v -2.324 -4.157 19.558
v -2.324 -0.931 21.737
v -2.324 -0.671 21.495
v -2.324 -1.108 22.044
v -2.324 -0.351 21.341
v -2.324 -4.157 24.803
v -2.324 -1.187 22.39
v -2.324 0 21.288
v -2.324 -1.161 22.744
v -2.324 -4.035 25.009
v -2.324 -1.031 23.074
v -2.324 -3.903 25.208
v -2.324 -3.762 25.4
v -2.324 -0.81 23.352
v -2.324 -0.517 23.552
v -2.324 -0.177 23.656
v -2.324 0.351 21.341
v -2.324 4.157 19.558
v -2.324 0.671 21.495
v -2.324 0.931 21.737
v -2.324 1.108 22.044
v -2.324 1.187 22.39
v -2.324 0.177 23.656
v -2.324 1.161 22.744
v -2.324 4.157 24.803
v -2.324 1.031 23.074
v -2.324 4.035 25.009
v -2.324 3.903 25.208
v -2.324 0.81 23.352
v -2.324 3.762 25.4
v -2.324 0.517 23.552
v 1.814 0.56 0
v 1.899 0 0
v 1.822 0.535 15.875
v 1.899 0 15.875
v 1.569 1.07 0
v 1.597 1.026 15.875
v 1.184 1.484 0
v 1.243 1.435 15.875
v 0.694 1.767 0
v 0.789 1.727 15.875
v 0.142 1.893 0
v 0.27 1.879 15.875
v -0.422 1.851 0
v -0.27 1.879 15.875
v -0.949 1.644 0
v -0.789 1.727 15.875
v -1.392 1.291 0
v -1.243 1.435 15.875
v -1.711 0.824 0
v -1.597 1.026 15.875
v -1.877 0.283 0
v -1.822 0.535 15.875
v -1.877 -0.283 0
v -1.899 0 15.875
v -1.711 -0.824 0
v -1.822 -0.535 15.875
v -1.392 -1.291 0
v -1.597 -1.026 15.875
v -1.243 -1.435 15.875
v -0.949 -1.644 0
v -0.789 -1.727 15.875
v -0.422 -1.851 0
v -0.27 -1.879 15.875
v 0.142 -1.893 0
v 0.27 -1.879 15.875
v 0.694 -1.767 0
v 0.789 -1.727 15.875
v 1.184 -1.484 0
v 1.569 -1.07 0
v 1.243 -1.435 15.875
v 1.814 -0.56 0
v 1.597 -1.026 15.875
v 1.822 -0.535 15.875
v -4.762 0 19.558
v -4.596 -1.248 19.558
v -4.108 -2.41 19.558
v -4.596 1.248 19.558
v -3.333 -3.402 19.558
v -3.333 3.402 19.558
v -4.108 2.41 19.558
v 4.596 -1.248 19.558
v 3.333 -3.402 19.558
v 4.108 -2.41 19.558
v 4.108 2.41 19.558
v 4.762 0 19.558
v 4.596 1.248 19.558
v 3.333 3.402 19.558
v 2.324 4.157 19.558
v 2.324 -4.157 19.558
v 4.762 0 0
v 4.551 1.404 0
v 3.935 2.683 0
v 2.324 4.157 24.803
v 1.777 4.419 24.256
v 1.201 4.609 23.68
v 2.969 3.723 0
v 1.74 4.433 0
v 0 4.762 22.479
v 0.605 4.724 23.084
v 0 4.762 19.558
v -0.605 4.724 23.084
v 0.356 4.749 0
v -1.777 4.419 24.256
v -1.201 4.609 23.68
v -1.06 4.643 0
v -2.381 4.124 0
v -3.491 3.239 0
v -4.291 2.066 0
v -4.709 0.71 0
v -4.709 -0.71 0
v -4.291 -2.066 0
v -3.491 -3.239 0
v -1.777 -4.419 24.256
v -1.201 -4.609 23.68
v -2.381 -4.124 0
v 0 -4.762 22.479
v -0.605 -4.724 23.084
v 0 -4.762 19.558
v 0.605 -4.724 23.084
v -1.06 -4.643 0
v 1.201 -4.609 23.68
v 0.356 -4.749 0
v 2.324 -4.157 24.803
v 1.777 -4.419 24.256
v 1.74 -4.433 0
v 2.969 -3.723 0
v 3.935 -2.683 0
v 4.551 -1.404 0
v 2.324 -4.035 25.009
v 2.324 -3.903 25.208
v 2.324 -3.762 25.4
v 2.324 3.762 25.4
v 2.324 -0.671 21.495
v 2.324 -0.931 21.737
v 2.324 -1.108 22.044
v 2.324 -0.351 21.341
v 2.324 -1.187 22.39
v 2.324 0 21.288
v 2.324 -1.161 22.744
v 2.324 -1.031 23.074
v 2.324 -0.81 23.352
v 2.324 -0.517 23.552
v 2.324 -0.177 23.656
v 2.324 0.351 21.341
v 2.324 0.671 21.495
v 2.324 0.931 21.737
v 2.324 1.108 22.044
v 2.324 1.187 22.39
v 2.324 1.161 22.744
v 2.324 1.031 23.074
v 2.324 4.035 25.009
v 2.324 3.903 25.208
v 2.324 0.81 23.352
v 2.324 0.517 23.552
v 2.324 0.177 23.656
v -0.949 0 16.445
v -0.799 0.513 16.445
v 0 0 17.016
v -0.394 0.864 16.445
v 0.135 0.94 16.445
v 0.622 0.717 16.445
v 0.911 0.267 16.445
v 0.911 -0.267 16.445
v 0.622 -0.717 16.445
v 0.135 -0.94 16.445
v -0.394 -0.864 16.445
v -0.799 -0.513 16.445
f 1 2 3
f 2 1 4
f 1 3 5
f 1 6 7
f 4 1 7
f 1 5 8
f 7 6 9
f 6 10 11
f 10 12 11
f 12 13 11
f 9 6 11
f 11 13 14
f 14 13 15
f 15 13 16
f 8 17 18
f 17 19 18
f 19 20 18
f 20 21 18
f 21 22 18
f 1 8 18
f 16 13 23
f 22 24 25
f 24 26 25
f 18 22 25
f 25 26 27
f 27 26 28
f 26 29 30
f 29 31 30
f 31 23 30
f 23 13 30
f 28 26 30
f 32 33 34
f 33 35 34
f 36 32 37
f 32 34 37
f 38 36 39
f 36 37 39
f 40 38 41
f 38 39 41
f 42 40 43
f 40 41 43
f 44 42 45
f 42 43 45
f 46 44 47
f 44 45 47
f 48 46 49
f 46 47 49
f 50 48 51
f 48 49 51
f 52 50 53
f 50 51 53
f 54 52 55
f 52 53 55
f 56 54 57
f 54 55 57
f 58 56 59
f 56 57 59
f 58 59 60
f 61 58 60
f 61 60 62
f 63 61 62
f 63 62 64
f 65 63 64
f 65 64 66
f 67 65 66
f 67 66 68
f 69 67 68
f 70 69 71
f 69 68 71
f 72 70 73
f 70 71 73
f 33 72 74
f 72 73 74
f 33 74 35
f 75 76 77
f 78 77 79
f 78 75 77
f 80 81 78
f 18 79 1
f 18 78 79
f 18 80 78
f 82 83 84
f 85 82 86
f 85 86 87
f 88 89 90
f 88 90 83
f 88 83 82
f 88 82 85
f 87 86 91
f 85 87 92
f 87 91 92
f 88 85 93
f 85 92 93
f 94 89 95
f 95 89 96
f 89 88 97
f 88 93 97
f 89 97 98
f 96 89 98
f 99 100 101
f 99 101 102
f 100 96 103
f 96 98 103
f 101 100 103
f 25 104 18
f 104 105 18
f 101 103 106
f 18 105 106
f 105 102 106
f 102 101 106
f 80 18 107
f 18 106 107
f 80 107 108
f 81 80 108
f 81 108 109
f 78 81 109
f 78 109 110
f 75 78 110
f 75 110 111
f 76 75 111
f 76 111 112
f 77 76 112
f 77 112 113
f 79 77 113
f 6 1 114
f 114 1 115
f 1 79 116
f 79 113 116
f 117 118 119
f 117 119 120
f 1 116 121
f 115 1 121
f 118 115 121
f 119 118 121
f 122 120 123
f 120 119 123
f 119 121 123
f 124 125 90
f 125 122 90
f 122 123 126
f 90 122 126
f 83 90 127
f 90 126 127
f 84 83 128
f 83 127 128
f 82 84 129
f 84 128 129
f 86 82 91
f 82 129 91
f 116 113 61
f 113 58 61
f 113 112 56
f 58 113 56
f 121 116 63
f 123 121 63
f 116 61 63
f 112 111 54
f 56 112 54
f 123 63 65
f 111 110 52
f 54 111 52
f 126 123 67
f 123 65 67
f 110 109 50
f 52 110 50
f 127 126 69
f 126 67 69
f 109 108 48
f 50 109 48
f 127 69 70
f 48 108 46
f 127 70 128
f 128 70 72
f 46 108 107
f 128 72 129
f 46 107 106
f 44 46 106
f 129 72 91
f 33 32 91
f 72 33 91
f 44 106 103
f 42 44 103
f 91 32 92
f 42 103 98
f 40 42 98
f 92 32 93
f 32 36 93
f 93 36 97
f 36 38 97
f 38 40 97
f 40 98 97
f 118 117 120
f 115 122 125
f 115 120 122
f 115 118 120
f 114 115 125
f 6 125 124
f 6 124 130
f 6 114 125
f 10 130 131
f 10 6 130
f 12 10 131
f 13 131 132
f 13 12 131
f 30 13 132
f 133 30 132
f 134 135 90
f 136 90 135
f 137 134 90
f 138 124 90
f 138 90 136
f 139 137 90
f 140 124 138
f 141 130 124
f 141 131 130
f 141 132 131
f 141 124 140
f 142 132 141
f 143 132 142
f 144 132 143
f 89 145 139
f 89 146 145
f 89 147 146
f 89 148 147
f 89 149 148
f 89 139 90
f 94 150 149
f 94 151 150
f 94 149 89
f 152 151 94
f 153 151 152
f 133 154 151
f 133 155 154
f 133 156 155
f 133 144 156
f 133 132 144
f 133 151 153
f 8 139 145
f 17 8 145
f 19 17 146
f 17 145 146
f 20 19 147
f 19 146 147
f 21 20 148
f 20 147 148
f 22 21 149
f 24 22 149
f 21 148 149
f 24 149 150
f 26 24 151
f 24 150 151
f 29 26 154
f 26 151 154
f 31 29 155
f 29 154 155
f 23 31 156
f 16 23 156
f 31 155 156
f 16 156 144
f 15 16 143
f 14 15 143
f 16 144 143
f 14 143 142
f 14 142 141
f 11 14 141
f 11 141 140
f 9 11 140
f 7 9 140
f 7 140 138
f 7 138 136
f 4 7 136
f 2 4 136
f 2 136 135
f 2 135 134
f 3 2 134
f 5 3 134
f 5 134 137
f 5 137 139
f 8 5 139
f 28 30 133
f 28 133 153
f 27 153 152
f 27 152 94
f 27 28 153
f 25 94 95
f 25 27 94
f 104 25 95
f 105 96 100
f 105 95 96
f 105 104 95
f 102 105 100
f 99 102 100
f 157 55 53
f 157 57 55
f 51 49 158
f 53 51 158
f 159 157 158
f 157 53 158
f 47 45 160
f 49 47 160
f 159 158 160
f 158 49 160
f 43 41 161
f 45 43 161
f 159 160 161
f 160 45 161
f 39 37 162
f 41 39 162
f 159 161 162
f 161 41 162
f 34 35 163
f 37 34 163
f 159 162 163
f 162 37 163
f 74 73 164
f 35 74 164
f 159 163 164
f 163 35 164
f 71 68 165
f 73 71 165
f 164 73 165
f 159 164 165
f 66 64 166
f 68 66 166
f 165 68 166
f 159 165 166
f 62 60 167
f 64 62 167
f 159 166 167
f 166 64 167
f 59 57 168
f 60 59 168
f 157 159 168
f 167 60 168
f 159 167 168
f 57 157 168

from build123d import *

# Parameters (mm, degrees)
SKETCH1_R                       = 4.7625
BOSS_EXTRUDE1_DEPTH             = 25.4
SKETCH2_OUTSIDE_W               = 17.274
SKETCH2_OUTSIDE_H               = 17.274
SKETCH2_OUTSIDE_W_2             = 4.6482
SKETCH2_OUTSIDE_H_2             = 9.525
CUT_EXTRUDE1_DEPTH              = 5.842
F_3_32_0_09375_DIAMETER_HOLE1_D = 2.38125
CUT_EXTRUDE2_DEPTH              = 27.796665946
TAP_DRILL_FOR_10_24_TAP1_D      = 3.7973
TAP_DRILL_FOR_10_24_TAP1_DEPTH  = 15.875
TAP_DRILL_FOR_10_24_TAP1_TIP    = 1.140824014


with BuildPart() as part:
    # Sketch1 → Boss-Extrude1 (new body)
    with BuildSketch(Plane.XY):
        Circle(SKETCH1_R)
    extrude(amount=BOSS_EXTRUDE1_DEPTH)

    # Sketch2 outside → Cut-Extrude1 (cut)
    with BuildSketch(Plane.XY.offset(25.4)):
        Rectangle(SKETCH2_OUTSIDE_W, SKETCH2_OUTSIDE_H)
        Rectangle(SKETCH2_OUTSIDE_W_2, SKETCH2_OUTSIDE_H_2, mode=Mode.SUBTRACT)
    extrude(amount=-CUT_EXTRUDE1_DEPTH, mode=Mode.SUBTRACT)

    # 3/32 (0.09375) Diameter Hole1 (through all)
    with Locations(Plane.ZY.offset(2.3241)):
        with Locations((22.479, 0)):
            Hole(F_3_32_0_09375_DIAMETER_HOLE1_D / 2)

    # Sketch5 → Cut-Extrude2 (cut, through all)
    with BuildSketch(Plane.ZY.offset(2.3241)):
        with BuildLine():
            Line((22.479, 4.7625), (32.004, 4.7625))
            Line((32.004, 4.7625), (32.004, -4.7625))
            Line((32.004, -4.7625), (22.479, -4.7625))
            ThreePointArc((22.479, -4.7625), (27.2415, 0), (22.479, 4.7625))
        make_face()
    extrude(amount=-CUT_EXTRUDE2_DEPTH, mode=Mode.SUBTRACT)

    # Tap Drill for #10-24 Tap1
    with Locations(Plane(origin=(0, 0, 0), x_dir=(-1, 0, 0), z_dir=(0, 0, -1))):
        with Locations((0, 0)):
            Hole(TAP_DRILL_FOR_10_24_TAP1_D / 2, depth=TAP_DRILL_FOR_10_24_TAP1_DEPTH)
            with Locations((0, 0, -(TAP_DRILL_FOR_10_24_TAP1_DEPTH + TAP_DRILL_FOR_10_24_TAP1_TIP / 2))):  # 118° drill point
                Cone(0, TAP_DRILL_FOR_10_24_TAP1_D / 2, TAP_DRILL_FOR_10_24_TAP1_TIP, mode=Mode.SUBTRACT)


solid = part.part
